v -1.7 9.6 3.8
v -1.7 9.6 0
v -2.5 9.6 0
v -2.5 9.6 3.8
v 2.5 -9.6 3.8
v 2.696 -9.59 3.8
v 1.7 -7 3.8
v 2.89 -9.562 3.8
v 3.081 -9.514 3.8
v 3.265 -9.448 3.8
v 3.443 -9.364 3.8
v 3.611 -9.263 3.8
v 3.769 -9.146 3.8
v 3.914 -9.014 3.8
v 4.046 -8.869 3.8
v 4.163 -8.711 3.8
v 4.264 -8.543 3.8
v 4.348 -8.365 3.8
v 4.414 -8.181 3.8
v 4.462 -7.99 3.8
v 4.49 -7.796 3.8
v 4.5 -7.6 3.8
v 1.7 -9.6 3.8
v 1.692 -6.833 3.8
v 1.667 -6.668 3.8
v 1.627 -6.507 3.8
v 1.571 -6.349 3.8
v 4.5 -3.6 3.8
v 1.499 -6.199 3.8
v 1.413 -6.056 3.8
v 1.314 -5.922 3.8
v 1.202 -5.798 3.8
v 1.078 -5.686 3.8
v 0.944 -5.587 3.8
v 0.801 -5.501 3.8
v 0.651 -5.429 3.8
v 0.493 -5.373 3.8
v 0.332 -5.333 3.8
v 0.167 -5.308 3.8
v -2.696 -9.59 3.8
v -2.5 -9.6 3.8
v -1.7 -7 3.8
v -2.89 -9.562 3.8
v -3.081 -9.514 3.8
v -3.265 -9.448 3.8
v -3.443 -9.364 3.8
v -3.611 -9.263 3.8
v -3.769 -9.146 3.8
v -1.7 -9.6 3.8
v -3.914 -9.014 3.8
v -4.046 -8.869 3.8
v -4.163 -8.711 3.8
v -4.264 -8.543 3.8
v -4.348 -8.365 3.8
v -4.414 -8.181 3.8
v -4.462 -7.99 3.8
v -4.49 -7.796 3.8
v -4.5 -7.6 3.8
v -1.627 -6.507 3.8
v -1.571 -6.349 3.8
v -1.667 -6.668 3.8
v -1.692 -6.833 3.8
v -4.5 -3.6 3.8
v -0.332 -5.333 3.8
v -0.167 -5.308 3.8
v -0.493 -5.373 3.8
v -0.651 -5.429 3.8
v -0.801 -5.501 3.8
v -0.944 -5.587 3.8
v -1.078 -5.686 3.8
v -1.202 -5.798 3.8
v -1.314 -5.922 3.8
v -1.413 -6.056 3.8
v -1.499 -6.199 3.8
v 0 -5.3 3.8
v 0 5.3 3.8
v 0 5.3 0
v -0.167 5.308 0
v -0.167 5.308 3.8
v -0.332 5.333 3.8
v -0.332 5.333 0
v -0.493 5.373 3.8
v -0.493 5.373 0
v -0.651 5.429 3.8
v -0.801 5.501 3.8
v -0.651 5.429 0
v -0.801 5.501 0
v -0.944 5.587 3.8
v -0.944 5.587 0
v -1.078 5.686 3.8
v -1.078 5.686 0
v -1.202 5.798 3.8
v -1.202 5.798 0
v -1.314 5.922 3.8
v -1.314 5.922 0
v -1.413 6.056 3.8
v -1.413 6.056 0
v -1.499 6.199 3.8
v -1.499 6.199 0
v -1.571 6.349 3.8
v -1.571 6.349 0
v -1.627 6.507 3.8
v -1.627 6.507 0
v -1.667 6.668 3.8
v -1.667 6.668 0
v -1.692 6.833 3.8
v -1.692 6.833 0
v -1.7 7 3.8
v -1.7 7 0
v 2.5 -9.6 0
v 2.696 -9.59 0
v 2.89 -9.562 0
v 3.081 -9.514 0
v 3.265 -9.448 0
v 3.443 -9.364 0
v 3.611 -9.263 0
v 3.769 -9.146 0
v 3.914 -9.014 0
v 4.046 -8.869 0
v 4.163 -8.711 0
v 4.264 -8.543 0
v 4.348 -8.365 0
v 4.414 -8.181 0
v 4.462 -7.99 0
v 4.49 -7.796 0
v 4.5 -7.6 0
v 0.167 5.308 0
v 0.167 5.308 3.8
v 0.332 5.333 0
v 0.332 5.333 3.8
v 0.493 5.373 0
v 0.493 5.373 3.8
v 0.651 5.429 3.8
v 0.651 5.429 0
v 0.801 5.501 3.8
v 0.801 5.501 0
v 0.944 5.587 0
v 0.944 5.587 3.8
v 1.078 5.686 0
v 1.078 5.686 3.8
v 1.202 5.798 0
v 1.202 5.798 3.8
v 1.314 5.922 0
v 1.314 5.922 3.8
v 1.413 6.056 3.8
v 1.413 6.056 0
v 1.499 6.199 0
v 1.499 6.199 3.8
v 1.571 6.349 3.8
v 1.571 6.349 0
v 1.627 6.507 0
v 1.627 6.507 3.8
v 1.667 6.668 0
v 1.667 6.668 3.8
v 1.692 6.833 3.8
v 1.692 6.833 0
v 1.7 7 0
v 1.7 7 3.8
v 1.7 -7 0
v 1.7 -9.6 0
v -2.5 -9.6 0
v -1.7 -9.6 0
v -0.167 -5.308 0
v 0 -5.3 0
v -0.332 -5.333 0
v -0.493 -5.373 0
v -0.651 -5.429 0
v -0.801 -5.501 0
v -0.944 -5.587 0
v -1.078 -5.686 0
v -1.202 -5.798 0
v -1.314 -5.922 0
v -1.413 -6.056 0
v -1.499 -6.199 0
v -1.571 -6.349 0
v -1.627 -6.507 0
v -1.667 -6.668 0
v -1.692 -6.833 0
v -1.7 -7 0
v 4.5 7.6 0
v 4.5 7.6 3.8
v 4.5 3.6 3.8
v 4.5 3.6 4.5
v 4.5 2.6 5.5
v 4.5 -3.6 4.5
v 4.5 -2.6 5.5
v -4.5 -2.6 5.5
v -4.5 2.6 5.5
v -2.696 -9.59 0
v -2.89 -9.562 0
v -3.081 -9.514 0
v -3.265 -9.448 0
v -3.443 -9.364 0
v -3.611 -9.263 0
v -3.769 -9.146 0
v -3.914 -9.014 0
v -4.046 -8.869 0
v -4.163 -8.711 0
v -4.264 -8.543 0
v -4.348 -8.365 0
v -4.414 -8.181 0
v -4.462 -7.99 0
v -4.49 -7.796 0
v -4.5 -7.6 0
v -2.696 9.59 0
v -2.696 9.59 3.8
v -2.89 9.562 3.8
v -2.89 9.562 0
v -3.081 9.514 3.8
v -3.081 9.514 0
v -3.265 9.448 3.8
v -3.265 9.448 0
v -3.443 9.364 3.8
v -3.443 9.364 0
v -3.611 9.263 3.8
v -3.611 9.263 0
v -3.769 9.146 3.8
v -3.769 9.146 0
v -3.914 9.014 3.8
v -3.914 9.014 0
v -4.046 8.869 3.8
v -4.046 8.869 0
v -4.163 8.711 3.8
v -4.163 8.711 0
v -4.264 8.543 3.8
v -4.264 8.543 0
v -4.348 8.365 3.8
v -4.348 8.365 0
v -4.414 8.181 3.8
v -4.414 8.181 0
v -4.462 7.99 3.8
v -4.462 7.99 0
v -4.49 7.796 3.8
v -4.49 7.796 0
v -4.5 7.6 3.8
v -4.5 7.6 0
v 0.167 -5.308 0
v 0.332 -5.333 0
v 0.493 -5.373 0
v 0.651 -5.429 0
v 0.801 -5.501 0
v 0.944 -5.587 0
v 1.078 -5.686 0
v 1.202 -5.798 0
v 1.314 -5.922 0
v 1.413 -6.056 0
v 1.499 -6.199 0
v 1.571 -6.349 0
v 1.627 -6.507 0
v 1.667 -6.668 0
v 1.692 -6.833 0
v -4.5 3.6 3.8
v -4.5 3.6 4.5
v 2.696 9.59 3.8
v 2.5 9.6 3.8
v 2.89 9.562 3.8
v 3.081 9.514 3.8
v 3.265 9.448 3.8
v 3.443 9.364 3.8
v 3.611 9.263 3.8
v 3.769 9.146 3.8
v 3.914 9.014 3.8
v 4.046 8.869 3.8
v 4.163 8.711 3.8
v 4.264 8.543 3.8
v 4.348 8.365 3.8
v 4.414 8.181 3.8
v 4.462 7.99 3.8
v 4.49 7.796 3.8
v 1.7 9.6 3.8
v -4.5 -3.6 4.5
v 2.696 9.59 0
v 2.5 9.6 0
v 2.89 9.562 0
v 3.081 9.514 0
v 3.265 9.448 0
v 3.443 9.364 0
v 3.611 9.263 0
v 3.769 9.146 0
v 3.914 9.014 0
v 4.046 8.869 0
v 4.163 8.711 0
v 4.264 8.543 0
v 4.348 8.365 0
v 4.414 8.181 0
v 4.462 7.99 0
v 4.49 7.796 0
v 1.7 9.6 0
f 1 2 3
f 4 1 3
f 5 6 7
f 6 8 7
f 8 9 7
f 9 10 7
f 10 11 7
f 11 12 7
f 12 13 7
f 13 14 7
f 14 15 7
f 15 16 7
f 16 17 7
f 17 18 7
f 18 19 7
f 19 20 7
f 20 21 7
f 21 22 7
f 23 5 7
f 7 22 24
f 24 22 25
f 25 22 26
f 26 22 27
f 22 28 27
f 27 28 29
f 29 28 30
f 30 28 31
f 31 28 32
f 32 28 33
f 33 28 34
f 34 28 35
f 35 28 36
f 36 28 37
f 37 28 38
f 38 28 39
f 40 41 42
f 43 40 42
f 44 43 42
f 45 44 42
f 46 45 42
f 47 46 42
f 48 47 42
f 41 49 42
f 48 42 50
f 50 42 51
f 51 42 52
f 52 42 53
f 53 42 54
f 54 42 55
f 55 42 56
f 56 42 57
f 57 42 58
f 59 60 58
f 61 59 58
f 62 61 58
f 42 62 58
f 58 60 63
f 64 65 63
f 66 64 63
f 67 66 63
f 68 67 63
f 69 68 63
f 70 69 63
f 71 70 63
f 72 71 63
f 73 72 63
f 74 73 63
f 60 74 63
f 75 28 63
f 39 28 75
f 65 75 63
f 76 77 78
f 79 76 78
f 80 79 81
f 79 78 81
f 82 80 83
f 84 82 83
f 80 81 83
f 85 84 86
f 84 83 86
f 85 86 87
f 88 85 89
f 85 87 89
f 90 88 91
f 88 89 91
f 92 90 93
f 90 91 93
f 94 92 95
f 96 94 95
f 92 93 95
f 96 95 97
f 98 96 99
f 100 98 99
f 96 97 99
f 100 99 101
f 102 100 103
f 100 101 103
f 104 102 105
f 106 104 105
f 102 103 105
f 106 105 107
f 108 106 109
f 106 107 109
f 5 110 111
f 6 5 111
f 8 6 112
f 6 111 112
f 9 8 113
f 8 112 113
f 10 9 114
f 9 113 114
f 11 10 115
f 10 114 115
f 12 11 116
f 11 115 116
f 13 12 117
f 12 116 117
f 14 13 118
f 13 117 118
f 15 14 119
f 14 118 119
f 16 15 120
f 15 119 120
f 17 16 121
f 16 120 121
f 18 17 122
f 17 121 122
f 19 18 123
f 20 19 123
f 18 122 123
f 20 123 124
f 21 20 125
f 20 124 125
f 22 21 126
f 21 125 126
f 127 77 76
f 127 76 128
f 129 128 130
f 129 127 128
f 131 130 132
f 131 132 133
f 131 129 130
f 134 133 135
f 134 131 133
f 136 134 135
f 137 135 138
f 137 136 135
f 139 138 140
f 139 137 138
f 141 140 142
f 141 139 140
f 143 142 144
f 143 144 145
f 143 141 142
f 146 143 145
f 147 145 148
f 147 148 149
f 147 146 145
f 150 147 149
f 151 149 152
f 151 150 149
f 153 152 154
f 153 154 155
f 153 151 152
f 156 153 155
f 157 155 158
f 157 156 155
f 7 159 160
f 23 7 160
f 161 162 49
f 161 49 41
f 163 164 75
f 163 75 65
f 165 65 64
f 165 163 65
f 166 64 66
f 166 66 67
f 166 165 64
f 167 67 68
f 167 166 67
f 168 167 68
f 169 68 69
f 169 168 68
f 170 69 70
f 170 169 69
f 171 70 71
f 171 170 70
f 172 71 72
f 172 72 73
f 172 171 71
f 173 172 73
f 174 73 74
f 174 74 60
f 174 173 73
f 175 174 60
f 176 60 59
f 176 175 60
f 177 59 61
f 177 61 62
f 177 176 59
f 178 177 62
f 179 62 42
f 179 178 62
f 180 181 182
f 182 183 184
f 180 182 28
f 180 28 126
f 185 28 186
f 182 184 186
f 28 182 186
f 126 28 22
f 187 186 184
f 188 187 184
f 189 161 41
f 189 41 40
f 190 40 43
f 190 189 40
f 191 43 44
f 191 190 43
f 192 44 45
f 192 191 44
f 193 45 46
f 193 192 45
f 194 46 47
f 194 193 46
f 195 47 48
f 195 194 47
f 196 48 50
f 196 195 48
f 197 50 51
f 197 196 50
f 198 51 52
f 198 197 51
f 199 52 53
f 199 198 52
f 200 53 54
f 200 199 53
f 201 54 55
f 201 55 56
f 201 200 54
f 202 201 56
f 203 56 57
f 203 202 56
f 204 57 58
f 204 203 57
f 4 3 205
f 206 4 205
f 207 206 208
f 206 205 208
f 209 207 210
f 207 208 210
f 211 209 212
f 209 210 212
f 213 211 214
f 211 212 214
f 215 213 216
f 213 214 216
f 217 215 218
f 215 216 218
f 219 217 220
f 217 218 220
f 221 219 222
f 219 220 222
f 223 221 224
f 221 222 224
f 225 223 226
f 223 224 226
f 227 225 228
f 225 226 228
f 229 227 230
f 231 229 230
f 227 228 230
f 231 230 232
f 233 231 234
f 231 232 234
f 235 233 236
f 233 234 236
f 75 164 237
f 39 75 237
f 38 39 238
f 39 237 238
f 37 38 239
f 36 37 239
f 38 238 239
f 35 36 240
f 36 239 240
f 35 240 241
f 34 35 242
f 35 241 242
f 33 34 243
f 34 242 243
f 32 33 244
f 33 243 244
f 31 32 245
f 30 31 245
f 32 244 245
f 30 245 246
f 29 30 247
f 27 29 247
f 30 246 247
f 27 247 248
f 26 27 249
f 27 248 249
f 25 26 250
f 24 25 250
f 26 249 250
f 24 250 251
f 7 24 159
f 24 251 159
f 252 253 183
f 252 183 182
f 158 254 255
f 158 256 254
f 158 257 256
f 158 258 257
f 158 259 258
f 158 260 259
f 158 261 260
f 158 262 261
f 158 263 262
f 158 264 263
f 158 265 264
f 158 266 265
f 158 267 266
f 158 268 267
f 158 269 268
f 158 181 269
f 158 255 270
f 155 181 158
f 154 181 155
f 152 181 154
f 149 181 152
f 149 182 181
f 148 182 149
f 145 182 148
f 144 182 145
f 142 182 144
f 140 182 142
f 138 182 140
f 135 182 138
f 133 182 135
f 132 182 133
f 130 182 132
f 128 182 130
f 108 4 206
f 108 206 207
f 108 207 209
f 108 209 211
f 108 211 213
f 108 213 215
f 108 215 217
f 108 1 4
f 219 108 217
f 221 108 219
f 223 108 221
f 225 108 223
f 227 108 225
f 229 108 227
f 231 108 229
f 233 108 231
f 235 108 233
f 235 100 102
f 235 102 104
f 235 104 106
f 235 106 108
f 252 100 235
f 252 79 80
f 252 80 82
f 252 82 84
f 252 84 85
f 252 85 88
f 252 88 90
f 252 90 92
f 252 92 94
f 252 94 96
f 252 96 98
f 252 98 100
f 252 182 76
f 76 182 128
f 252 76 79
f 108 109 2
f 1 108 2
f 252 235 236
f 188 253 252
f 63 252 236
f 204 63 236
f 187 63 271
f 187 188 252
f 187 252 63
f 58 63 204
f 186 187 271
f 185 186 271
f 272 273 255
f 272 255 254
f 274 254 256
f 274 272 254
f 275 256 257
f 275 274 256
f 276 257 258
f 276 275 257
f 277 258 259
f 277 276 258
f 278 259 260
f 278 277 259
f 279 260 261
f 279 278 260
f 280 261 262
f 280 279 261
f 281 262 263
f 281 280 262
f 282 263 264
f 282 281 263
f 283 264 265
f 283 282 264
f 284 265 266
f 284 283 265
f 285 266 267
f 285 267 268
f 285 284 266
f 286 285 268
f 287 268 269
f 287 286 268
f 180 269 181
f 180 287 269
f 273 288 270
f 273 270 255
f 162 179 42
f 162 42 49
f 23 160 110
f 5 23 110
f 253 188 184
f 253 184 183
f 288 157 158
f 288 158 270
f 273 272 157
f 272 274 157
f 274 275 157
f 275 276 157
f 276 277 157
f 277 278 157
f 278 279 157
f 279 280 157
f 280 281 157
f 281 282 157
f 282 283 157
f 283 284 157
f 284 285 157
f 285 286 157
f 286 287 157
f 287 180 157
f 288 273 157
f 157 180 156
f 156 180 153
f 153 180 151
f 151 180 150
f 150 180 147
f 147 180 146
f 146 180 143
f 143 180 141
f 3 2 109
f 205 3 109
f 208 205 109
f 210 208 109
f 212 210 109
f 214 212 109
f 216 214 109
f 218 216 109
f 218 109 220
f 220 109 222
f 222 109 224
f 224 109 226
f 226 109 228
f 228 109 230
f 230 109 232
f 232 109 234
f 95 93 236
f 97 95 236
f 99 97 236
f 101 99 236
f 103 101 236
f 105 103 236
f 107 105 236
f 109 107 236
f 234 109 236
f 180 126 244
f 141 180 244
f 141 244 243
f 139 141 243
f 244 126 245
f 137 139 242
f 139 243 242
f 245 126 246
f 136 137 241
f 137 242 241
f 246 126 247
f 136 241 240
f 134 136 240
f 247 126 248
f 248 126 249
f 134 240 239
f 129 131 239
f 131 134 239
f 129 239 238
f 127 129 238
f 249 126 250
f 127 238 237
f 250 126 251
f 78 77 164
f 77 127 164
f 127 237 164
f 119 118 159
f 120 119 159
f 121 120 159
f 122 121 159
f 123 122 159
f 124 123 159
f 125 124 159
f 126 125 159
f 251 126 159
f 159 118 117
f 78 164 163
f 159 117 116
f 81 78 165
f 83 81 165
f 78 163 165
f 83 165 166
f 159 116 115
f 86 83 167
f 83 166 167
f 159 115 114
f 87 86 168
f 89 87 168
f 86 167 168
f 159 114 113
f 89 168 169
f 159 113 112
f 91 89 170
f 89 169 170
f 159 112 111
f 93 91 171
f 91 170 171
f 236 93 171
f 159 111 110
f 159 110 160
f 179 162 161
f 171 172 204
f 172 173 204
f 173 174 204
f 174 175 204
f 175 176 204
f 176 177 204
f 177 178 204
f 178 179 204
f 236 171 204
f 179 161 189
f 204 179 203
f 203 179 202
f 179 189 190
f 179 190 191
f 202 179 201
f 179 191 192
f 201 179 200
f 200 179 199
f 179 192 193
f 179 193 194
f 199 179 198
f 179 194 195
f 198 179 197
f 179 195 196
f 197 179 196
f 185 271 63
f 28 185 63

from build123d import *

# Parameters (mm, degrees)
F1_DEPTH = 3.8
F3_DEPTH = 4.5


with BuildPart() as f1:
    # F0 (on Top) → F1 (new body)
    with BuildSketch(Plane.XY):
        with BuildLine():
            Line((4.5, -7.6), (4.5, 0))
            Line((4.5, 0), (0, 0))
            Line((0, 0), (0, -5.3))
            ThreePointArc((0, -5.3), (1.202082, -5.797918), (1.7, -7))
            Line((1.7, -7), (1.7, -9.6))
            Line((1.7, -9.6), (2.5, -9.6))
            ThreePointArc((2.5, -9.6), (3.914214, -9.014214), (4.5, -7.6))
        make_face()
    extrude(amount=F1_DEPTH)

    # F2 (on face) → F3 (join, through all)
    with BuildSketch(Plane.YZ.offset(4.5)):
        Polygon((-3.6, 4.5), (-3.6, 3.8), (0, 3.8), (0, 5.5), (-2.6, 5.5), align=None)
    extrude(amount=-F3_DEPTH)

    # F4: F1 across face


with BuildPart() as f1_1:
    add(f1.part)
    add(f1.part.mirror(Plane(origin=(0, -2.43609, 2.489933), x_dir=(0, -1, 0), z_dir=(-1, 0, 0))))

    # F5: F1 across face


with BuildPart() as f1_2:
    add(f1_1.part)
    add(f1_1.part.mirror(Plane(origin=(0, 0, 2.75), x_dir=(-1, 0, 0), z_dir=(0, 1, 0))))


solid = f1_2.part
